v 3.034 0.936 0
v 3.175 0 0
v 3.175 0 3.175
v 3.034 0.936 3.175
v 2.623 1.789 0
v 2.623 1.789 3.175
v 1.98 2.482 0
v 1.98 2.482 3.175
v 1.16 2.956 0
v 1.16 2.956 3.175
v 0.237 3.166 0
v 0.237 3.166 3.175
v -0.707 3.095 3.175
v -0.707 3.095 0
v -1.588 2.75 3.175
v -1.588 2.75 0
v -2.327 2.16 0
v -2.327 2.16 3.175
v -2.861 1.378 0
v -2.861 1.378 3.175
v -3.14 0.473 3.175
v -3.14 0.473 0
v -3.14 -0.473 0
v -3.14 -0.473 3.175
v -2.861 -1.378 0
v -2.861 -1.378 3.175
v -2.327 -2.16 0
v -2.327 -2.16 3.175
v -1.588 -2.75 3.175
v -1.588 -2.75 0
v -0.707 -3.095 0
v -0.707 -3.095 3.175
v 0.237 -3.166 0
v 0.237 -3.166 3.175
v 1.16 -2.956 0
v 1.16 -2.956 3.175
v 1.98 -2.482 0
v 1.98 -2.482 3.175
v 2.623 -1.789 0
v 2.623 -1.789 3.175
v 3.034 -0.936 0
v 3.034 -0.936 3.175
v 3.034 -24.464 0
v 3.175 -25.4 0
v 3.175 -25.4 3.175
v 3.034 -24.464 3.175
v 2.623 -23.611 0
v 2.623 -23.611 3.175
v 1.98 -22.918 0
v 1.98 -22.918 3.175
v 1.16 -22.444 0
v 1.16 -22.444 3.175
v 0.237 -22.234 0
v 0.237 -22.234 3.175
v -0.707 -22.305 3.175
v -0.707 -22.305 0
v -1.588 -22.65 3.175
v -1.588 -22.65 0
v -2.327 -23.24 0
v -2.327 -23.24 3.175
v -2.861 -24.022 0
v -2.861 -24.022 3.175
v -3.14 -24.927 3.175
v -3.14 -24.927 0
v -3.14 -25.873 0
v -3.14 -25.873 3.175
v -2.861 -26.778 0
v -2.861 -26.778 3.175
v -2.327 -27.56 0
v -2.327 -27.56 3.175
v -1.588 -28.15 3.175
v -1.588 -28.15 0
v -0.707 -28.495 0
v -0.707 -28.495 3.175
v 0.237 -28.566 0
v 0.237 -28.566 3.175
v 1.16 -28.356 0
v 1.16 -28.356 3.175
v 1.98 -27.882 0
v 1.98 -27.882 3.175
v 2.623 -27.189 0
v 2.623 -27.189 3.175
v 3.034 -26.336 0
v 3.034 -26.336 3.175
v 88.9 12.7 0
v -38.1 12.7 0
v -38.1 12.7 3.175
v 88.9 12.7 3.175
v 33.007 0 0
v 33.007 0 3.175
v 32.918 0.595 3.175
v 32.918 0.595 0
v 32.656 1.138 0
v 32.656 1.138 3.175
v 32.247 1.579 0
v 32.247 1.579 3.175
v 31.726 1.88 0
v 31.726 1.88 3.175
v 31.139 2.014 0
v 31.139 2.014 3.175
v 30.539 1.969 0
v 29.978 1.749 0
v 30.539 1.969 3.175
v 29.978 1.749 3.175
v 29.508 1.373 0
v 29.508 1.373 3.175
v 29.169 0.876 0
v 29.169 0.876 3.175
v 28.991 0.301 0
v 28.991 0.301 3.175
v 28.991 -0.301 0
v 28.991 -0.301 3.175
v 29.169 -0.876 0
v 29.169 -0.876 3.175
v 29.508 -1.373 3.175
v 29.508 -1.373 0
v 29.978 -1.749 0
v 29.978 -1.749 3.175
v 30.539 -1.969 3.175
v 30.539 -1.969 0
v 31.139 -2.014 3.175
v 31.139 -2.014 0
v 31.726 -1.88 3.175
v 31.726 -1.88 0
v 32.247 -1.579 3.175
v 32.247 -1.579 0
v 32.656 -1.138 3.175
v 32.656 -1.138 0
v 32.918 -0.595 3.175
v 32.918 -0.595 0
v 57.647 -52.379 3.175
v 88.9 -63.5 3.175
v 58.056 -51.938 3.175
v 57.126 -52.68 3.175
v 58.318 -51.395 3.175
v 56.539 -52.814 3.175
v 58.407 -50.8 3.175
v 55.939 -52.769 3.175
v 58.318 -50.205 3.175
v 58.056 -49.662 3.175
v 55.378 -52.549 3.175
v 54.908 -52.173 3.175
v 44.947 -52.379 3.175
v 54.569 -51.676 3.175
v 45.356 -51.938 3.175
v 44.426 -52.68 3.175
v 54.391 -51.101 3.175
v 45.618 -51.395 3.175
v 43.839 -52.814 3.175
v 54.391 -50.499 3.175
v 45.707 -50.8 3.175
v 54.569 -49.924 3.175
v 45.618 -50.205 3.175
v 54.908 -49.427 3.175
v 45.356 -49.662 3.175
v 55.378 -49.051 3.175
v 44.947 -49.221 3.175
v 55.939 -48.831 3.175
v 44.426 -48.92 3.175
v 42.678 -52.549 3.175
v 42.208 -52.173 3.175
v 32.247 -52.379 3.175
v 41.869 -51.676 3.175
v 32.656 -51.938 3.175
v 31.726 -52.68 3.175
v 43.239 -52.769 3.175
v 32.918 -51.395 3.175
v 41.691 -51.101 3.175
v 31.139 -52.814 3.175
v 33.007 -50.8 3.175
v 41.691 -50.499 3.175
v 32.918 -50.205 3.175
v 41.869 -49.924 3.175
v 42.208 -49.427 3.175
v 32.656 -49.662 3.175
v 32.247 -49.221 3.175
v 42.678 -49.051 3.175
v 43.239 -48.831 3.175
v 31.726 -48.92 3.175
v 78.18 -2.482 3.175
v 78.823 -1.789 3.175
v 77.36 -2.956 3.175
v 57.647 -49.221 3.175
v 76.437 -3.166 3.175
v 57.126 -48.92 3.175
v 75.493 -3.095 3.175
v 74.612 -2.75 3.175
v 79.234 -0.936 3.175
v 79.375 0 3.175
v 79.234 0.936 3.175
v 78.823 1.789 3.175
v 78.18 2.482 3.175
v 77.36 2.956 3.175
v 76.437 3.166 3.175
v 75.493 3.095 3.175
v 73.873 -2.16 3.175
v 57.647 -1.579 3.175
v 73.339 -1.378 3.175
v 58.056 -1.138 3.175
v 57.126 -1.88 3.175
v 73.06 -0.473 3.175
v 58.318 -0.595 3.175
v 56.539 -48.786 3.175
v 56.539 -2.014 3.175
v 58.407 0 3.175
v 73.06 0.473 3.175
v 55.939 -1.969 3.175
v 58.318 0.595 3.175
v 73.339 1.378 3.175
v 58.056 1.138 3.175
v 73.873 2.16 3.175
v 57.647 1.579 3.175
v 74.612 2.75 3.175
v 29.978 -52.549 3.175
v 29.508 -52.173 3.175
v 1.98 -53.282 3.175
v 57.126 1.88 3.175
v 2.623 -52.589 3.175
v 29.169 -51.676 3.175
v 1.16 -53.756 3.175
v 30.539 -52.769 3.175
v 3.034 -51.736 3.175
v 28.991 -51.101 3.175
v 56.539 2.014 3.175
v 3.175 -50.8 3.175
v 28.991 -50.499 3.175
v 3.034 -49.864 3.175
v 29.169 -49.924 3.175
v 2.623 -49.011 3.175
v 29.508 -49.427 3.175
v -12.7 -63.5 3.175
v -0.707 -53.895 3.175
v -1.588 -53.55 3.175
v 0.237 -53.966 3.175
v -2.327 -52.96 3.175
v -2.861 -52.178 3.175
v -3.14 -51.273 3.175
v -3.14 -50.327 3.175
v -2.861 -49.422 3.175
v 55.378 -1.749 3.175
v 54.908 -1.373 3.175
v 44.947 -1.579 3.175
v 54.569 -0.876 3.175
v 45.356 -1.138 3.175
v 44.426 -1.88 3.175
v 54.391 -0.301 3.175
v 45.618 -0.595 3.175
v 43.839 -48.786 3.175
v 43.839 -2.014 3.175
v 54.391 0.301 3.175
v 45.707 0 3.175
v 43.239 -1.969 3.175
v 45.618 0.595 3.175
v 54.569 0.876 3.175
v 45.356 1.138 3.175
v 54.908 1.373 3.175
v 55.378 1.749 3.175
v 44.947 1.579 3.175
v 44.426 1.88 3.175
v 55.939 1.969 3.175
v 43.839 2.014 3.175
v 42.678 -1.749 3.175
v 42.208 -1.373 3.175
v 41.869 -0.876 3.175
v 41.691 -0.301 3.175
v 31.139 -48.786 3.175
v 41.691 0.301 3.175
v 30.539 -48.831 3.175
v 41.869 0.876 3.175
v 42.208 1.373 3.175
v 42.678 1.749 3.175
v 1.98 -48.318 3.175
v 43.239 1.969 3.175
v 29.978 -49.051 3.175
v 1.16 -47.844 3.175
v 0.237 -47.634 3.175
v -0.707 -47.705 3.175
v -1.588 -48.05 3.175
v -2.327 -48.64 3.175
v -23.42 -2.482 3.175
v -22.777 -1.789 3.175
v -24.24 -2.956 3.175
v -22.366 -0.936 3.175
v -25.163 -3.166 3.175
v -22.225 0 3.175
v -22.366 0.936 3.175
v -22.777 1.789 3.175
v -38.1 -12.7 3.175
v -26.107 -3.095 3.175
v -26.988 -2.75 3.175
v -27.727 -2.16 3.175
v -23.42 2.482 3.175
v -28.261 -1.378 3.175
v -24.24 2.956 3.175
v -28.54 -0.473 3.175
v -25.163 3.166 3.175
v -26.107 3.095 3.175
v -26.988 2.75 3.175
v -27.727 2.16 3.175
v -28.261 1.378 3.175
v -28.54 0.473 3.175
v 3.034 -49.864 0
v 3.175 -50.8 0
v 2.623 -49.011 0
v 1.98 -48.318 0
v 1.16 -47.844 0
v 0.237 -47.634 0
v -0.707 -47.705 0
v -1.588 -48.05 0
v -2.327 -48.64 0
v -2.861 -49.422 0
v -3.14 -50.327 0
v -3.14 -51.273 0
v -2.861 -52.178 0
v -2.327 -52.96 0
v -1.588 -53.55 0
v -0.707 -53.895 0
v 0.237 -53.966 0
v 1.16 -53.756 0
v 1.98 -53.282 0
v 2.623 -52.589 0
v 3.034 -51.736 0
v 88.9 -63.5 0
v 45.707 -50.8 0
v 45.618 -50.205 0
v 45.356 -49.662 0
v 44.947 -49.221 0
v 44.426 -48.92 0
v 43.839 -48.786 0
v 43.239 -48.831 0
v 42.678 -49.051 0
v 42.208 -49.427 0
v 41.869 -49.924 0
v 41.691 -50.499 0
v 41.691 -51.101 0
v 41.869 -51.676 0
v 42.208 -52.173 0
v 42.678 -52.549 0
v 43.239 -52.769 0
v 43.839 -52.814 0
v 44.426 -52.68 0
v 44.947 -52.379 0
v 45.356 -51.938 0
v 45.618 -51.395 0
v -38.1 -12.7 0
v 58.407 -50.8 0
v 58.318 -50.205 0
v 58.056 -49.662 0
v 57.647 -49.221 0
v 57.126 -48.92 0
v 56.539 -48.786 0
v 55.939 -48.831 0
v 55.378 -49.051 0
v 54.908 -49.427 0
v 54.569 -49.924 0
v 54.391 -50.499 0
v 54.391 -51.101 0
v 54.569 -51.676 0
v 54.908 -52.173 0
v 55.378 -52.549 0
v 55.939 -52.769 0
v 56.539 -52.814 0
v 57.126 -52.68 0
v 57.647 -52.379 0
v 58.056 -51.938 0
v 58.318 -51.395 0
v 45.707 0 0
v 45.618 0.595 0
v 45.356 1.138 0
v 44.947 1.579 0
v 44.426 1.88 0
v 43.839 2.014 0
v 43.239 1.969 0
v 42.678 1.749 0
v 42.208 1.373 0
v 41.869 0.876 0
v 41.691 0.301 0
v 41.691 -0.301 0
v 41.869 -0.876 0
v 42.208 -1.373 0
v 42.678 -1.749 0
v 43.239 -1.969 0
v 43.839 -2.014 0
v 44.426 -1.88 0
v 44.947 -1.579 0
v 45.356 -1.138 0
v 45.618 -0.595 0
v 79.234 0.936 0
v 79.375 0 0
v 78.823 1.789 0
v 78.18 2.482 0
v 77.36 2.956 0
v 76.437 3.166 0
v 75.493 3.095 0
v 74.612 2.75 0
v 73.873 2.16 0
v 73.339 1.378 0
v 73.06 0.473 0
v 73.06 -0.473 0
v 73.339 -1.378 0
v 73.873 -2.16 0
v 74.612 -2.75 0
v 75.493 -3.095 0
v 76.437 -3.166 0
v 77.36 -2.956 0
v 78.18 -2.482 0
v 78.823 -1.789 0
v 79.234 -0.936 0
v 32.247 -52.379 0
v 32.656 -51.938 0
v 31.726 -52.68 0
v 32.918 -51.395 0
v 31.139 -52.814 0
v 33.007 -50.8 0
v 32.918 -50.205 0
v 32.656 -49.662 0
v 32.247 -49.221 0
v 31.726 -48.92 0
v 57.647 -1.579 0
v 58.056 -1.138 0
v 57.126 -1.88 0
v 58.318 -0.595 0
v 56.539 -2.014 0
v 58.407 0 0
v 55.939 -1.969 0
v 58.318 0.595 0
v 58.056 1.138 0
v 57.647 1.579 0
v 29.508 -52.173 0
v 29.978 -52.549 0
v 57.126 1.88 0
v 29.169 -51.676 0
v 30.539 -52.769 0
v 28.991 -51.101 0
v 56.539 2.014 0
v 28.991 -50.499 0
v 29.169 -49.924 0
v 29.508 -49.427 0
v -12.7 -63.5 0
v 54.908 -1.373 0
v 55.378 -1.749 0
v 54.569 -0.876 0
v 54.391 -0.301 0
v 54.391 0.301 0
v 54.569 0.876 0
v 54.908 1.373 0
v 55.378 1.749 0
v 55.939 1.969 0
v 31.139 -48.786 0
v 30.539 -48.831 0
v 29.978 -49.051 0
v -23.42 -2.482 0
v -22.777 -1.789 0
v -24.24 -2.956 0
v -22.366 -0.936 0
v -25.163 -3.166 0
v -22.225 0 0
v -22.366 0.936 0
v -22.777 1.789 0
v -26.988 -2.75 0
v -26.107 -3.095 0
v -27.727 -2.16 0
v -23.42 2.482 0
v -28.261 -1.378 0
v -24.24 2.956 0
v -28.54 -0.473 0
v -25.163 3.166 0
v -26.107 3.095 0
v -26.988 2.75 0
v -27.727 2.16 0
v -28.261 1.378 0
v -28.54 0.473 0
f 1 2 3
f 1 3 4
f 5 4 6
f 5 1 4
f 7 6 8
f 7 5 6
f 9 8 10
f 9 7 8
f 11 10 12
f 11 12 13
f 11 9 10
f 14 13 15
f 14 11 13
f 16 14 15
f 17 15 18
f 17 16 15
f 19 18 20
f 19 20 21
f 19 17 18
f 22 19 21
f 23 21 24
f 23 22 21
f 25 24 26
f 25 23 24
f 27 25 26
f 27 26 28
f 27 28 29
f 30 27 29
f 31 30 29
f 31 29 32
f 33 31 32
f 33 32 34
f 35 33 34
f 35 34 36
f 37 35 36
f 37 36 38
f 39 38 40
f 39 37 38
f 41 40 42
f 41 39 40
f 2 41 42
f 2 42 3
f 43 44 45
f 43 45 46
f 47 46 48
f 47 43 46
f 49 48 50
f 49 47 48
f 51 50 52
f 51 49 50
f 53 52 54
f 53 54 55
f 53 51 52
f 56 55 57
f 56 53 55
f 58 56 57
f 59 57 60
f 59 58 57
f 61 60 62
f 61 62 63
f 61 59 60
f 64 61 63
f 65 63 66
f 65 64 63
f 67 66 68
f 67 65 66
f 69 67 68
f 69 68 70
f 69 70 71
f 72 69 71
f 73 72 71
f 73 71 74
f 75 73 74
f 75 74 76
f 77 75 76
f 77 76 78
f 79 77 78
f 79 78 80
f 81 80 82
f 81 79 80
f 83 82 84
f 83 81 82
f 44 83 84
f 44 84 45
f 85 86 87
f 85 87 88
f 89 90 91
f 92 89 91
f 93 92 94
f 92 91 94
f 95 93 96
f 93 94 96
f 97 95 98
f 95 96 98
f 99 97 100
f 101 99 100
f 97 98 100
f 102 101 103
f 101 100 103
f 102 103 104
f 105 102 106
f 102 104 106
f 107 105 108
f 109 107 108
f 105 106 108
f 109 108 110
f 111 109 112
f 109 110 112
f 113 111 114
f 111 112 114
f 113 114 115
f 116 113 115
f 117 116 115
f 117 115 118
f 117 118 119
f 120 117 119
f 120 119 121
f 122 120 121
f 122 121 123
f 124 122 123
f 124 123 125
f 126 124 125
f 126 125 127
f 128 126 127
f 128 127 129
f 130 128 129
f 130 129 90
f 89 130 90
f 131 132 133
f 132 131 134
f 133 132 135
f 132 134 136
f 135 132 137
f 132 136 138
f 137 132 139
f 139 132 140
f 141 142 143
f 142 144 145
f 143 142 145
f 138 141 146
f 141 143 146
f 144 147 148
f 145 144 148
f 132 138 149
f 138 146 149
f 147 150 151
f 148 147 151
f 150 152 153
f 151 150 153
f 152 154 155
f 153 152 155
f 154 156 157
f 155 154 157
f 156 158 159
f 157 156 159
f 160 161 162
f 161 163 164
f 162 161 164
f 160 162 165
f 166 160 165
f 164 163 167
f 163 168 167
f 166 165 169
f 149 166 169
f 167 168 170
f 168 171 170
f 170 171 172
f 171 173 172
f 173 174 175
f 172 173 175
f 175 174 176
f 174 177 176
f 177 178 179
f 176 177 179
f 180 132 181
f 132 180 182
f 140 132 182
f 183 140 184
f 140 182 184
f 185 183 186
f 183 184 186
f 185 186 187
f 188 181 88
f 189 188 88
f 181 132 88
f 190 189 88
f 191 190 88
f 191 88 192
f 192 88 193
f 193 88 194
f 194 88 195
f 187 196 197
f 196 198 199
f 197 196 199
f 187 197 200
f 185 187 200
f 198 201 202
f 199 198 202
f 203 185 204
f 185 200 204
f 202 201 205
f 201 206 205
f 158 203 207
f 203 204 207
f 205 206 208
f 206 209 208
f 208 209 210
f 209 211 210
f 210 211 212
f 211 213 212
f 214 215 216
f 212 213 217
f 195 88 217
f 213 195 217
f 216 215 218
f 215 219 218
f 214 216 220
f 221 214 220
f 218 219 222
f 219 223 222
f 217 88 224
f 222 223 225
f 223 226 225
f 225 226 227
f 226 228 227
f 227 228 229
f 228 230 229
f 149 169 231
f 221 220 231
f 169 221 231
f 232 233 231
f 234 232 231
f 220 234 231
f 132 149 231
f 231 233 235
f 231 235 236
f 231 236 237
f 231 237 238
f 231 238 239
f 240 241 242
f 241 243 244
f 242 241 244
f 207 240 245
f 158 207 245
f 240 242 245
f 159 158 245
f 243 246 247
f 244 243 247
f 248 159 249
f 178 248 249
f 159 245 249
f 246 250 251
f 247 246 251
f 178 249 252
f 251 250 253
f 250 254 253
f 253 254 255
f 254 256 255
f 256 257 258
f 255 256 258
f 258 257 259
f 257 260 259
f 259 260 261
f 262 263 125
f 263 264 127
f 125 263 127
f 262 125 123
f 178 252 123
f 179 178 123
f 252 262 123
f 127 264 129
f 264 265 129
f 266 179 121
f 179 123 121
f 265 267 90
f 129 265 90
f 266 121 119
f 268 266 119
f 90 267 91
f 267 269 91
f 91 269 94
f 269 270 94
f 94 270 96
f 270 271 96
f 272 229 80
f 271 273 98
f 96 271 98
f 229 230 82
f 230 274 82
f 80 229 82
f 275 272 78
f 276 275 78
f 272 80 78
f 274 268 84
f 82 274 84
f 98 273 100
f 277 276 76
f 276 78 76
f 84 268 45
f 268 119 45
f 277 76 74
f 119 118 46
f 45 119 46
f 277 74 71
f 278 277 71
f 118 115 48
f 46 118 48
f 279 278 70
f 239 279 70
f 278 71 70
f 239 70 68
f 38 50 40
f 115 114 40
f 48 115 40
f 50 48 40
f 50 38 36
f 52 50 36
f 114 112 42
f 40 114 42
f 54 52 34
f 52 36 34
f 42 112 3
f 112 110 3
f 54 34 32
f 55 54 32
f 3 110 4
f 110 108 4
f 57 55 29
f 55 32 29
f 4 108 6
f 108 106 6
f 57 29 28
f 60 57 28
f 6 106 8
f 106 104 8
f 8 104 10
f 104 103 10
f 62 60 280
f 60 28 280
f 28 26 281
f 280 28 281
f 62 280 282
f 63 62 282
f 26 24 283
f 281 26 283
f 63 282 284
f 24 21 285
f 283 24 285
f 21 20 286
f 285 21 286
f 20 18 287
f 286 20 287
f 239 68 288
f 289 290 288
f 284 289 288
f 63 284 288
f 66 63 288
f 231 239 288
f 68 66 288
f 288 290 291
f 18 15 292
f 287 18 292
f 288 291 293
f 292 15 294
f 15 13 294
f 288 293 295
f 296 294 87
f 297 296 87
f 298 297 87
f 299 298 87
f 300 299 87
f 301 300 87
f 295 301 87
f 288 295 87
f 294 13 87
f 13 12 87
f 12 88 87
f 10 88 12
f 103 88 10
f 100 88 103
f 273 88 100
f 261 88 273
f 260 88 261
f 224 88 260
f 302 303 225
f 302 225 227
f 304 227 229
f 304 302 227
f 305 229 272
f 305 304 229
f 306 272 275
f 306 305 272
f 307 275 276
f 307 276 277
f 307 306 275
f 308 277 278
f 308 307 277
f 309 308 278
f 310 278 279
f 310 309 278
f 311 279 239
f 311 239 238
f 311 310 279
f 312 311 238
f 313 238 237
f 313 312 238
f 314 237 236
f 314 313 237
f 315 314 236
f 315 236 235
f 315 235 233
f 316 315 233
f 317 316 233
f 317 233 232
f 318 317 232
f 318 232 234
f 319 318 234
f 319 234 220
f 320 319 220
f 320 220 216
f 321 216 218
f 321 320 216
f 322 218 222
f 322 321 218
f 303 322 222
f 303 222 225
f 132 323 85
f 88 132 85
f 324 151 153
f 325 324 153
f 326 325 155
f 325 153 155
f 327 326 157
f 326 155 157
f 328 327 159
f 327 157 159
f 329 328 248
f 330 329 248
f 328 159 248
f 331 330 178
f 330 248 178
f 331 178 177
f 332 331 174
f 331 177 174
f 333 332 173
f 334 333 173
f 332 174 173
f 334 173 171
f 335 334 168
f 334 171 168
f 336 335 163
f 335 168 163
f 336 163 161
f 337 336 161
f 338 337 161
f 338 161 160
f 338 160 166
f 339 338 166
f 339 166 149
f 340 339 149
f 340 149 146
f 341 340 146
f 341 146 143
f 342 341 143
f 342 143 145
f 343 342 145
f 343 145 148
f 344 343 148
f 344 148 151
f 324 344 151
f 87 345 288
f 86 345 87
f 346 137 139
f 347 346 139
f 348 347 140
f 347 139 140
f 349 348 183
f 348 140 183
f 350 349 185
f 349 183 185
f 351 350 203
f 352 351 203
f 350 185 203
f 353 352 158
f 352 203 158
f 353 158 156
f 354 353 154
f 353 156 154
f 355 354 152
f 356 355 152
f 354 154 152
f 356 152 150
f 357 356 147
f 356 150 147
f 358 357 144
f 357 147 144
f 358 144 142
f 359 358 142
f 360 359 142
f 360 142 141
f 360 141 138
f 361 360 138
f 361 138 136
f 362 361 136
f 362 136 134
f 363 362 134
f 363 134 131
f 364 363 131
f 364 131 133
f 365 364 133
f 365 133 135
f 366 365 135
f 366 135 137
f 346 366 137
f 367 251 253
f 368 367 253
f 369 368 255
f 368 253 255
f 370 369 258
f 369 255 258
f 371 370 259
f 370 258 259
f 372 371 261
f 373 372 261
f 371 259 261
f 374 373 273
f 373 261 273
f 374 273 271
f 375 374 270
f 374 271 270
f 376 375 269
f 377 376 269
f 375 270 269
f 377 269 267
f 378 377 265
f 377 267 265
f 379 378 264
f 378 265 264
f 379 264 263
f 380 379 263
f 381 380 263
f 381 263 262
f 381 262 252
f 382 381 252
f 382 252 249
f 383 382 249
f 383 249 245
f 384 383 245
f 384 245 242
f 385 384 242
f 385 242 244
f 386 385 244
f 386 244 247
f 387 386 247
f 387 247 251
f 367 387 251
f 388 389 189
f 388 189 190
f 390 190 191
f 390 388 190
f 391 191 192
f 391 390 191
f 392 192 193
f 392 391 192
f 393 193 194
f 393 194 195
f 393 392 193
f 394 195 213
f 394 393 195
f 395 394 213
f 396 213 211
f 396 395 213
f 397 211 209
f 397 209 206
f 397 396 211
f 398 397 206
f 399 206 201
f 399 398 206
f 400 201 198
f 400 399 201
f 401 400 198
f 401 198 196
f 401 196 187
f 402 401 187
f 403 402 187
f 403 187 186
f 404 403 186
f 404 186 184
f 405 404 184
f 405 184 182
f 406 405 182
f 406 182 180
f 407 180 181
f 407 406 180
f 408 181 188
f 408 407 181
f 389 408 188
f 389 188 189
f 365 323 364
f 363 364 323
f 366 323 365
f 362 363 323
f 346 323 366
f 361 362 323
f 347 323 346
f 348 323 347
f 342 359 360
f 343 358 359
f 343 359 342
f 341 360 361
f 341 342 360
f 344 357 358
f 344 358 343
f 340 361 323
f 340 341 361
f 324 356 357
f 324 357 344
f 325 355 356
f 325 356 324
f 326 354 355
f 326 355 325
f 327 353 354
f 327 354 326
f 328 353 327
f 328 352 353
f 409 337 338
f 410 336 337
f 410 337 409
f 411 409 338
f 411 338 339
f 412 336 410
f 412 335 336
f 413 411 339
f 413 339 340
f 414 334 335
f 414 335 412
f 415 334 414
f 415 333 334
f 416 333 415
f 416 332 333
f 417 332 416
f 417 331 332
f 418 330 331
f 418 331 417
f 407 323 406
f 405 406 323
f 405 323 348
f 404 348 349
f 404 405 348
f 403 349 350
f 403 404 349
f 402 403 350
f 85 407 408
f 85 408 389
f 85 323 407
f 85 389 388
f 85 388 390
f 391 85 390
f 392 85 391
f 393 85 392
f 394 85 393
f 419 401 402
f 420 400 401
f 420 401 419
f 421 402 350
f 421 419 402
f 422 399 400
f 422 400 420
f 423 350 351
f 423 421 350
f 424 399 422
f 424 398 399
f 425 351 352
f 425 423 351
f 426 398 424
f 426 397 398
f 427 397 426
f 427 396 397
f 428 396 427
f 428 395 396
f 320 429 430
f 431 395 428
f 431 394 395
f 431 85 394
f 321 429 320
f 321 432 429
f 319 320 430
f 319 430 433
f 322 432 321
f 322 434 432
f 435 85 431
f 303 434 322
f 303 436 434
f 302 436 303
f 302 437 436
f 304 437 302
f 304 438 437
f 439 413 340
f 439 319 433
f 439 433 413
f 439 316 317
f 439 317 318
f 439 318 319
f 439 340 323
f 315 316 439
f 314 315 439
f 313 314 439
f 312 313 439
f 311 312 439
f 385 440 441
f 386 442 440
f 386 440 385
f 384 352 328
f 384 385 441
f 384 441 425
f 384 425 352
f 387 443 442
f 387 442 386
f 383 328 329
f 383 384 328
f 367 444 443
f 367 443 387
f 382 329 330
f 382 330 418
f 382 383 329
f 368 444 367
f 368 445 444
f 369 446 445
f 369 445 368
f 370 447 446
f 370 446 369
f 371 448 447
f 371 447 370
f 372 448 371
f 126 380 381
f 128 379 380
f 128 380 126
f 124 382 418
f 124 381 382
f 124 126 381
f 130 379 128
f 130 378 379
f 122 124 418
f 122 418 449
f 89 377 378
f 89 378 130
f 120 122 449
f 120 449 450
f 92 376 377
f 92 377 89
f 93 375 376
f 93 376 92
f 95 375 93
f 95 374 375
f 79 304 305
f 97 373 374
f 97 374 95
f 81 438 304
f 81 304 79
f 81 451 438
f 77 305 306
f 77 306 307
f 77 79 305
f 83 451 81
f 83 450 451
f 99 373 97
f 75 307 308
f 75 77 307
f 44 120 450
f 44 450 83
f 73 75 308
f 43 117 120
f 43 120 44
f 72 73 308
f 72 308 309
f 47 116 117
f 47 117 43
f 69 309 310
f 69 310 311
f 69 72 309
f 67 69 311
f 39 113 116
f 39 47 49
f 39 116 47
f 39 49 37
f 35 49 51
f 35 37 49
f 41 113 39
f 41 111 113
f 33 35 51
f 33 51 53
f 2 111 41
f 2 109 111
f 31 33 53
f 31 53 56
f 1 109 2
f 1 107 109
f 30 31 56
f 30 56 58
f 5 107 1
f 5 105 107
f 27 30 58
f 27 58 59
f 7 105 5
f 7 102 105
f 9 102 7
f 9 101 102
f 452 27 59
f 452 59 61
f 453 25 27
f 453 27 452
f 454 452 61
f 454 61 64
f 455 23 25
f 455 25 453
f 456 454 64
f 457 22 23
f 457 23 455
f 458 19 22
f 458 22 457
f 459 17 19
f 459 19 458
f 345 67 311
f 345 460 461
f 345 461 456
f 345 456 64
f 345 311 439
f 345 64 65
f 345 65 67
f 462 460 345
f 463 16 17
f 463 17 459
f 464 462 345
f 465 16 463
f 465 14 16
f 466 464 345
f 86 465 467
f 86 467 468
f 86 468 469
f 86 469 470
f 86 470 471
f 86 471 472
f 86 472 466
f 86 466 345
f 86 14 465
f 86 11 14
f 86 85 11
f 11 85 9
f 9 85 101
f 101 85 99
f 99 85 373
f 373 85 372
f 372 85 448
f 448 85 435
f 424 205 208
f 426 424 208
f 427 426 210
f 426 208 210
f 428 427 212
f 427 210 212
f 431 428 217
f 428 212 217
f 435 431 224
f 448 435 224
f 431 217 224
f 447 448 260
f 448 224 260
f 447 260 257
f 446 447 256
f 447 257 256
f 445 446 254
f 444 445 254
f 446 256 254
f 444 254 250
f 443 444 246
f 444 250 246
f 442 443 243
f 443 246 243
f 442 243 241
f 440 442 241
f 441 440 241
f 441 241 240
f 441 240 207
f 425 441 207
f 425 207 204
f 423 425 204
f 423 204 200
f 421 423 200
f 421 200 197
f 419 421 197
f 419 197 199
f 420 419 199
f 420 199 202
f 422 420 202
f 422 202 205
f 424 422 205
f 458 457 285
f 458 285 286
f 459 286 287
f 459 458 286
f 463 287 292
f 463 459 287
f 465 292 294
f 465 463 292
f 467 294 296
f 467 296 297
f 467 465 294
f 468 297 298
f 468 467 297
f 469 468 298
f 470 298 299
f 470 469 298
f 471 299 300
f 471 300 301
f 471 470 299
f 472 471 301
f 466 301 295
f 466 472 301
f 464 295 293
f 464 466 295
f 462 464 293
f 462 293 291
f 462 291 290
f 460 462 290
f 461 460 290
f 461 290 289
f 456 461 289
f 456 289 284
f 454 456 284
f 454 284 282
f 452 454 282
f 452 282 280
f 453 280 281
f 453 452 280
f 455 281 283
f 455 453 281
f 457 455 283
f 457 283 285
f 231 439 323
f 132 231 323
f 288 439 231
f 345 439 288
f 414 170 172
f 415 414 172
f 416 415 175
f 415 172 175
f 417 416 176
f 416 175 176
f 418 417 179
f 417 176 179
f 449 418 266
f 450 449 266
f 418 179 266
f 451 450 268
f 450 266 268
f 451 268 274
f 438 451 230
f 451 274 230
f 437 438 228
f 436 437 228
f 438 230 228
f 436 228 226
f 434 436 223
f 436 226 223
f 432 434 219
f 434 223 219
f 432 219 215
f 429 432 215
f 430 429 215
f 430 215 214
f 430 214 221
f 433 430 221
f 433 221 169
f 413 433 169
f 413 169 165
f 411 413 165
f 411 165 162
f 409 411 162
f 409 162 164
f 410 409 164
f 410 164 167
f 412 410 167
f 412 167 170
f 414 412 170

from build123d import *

# Parameters (mm, degrees)
SKETCH4_R           = 3.175
BOSS_EXTRUDE1_DEPTH = 3.175
SKETCH7_R           = 2.0193
CUT_EXTRUDE4_DEPTH  = 5.08


with BuildPart() as part:
    # Sketch4 → Boss-Extrude1 (new body)
    with BuildSketch(Plane.XY):
        Polygon((-38.1, 12.7), (88.9, 12.7), (88.9, -12.7), (88.9, -63.5), (12.7, -63.5), (-12.7, -63.5), (-38.1, -12.7), align=None)
        with Locations((-25.4, 0)):
            Circle(SKETCH4_R, mode=Mode.SUBTRACT)
        Circle(SKETCH4_R, mode=Mode.SUBTRACT)
        with Locations((0, -25.4)):
            Circle(SKETCH4_R, mode=Mode.SUBTRACT)
        with Locations((0, -50.8)):
            Circle(SKETCH4_R, mode=Mode.SUBTRACT)
        with Locations((76.2, 0)):
            Circle(SKETCH4_R, mode=Mode.SUBTRACT)
    extrude(amount=BOSS_EXTRUDE1_DEPTH)

    # Sketch7 → Cut-Extrude4 (cut)
    with BuildSketch(Plane.XY.offset(3.175)):
        with Locations((30.988, -50.8)):
            Circle(SKETCH7_R)
        with Locations((43.688, -50.8)):
            Circle(SKETCH7_R)
        with Locations((56.388, -50.8)):
            Circle(SKETCH7_R)
        with Locations((56.388, 0)):
            Circle(SKETCH7_R)
        with Locations((30.988, 0)):
            Circle(SKETCH7_R)
        with Locations((43.688, 0)):
            Circle(SKETCH7_R)
    extrude(amount=-CUT_EXTRUDE4_DEPTH, mode=Mode.SUBTRACT)


solid = part.part
